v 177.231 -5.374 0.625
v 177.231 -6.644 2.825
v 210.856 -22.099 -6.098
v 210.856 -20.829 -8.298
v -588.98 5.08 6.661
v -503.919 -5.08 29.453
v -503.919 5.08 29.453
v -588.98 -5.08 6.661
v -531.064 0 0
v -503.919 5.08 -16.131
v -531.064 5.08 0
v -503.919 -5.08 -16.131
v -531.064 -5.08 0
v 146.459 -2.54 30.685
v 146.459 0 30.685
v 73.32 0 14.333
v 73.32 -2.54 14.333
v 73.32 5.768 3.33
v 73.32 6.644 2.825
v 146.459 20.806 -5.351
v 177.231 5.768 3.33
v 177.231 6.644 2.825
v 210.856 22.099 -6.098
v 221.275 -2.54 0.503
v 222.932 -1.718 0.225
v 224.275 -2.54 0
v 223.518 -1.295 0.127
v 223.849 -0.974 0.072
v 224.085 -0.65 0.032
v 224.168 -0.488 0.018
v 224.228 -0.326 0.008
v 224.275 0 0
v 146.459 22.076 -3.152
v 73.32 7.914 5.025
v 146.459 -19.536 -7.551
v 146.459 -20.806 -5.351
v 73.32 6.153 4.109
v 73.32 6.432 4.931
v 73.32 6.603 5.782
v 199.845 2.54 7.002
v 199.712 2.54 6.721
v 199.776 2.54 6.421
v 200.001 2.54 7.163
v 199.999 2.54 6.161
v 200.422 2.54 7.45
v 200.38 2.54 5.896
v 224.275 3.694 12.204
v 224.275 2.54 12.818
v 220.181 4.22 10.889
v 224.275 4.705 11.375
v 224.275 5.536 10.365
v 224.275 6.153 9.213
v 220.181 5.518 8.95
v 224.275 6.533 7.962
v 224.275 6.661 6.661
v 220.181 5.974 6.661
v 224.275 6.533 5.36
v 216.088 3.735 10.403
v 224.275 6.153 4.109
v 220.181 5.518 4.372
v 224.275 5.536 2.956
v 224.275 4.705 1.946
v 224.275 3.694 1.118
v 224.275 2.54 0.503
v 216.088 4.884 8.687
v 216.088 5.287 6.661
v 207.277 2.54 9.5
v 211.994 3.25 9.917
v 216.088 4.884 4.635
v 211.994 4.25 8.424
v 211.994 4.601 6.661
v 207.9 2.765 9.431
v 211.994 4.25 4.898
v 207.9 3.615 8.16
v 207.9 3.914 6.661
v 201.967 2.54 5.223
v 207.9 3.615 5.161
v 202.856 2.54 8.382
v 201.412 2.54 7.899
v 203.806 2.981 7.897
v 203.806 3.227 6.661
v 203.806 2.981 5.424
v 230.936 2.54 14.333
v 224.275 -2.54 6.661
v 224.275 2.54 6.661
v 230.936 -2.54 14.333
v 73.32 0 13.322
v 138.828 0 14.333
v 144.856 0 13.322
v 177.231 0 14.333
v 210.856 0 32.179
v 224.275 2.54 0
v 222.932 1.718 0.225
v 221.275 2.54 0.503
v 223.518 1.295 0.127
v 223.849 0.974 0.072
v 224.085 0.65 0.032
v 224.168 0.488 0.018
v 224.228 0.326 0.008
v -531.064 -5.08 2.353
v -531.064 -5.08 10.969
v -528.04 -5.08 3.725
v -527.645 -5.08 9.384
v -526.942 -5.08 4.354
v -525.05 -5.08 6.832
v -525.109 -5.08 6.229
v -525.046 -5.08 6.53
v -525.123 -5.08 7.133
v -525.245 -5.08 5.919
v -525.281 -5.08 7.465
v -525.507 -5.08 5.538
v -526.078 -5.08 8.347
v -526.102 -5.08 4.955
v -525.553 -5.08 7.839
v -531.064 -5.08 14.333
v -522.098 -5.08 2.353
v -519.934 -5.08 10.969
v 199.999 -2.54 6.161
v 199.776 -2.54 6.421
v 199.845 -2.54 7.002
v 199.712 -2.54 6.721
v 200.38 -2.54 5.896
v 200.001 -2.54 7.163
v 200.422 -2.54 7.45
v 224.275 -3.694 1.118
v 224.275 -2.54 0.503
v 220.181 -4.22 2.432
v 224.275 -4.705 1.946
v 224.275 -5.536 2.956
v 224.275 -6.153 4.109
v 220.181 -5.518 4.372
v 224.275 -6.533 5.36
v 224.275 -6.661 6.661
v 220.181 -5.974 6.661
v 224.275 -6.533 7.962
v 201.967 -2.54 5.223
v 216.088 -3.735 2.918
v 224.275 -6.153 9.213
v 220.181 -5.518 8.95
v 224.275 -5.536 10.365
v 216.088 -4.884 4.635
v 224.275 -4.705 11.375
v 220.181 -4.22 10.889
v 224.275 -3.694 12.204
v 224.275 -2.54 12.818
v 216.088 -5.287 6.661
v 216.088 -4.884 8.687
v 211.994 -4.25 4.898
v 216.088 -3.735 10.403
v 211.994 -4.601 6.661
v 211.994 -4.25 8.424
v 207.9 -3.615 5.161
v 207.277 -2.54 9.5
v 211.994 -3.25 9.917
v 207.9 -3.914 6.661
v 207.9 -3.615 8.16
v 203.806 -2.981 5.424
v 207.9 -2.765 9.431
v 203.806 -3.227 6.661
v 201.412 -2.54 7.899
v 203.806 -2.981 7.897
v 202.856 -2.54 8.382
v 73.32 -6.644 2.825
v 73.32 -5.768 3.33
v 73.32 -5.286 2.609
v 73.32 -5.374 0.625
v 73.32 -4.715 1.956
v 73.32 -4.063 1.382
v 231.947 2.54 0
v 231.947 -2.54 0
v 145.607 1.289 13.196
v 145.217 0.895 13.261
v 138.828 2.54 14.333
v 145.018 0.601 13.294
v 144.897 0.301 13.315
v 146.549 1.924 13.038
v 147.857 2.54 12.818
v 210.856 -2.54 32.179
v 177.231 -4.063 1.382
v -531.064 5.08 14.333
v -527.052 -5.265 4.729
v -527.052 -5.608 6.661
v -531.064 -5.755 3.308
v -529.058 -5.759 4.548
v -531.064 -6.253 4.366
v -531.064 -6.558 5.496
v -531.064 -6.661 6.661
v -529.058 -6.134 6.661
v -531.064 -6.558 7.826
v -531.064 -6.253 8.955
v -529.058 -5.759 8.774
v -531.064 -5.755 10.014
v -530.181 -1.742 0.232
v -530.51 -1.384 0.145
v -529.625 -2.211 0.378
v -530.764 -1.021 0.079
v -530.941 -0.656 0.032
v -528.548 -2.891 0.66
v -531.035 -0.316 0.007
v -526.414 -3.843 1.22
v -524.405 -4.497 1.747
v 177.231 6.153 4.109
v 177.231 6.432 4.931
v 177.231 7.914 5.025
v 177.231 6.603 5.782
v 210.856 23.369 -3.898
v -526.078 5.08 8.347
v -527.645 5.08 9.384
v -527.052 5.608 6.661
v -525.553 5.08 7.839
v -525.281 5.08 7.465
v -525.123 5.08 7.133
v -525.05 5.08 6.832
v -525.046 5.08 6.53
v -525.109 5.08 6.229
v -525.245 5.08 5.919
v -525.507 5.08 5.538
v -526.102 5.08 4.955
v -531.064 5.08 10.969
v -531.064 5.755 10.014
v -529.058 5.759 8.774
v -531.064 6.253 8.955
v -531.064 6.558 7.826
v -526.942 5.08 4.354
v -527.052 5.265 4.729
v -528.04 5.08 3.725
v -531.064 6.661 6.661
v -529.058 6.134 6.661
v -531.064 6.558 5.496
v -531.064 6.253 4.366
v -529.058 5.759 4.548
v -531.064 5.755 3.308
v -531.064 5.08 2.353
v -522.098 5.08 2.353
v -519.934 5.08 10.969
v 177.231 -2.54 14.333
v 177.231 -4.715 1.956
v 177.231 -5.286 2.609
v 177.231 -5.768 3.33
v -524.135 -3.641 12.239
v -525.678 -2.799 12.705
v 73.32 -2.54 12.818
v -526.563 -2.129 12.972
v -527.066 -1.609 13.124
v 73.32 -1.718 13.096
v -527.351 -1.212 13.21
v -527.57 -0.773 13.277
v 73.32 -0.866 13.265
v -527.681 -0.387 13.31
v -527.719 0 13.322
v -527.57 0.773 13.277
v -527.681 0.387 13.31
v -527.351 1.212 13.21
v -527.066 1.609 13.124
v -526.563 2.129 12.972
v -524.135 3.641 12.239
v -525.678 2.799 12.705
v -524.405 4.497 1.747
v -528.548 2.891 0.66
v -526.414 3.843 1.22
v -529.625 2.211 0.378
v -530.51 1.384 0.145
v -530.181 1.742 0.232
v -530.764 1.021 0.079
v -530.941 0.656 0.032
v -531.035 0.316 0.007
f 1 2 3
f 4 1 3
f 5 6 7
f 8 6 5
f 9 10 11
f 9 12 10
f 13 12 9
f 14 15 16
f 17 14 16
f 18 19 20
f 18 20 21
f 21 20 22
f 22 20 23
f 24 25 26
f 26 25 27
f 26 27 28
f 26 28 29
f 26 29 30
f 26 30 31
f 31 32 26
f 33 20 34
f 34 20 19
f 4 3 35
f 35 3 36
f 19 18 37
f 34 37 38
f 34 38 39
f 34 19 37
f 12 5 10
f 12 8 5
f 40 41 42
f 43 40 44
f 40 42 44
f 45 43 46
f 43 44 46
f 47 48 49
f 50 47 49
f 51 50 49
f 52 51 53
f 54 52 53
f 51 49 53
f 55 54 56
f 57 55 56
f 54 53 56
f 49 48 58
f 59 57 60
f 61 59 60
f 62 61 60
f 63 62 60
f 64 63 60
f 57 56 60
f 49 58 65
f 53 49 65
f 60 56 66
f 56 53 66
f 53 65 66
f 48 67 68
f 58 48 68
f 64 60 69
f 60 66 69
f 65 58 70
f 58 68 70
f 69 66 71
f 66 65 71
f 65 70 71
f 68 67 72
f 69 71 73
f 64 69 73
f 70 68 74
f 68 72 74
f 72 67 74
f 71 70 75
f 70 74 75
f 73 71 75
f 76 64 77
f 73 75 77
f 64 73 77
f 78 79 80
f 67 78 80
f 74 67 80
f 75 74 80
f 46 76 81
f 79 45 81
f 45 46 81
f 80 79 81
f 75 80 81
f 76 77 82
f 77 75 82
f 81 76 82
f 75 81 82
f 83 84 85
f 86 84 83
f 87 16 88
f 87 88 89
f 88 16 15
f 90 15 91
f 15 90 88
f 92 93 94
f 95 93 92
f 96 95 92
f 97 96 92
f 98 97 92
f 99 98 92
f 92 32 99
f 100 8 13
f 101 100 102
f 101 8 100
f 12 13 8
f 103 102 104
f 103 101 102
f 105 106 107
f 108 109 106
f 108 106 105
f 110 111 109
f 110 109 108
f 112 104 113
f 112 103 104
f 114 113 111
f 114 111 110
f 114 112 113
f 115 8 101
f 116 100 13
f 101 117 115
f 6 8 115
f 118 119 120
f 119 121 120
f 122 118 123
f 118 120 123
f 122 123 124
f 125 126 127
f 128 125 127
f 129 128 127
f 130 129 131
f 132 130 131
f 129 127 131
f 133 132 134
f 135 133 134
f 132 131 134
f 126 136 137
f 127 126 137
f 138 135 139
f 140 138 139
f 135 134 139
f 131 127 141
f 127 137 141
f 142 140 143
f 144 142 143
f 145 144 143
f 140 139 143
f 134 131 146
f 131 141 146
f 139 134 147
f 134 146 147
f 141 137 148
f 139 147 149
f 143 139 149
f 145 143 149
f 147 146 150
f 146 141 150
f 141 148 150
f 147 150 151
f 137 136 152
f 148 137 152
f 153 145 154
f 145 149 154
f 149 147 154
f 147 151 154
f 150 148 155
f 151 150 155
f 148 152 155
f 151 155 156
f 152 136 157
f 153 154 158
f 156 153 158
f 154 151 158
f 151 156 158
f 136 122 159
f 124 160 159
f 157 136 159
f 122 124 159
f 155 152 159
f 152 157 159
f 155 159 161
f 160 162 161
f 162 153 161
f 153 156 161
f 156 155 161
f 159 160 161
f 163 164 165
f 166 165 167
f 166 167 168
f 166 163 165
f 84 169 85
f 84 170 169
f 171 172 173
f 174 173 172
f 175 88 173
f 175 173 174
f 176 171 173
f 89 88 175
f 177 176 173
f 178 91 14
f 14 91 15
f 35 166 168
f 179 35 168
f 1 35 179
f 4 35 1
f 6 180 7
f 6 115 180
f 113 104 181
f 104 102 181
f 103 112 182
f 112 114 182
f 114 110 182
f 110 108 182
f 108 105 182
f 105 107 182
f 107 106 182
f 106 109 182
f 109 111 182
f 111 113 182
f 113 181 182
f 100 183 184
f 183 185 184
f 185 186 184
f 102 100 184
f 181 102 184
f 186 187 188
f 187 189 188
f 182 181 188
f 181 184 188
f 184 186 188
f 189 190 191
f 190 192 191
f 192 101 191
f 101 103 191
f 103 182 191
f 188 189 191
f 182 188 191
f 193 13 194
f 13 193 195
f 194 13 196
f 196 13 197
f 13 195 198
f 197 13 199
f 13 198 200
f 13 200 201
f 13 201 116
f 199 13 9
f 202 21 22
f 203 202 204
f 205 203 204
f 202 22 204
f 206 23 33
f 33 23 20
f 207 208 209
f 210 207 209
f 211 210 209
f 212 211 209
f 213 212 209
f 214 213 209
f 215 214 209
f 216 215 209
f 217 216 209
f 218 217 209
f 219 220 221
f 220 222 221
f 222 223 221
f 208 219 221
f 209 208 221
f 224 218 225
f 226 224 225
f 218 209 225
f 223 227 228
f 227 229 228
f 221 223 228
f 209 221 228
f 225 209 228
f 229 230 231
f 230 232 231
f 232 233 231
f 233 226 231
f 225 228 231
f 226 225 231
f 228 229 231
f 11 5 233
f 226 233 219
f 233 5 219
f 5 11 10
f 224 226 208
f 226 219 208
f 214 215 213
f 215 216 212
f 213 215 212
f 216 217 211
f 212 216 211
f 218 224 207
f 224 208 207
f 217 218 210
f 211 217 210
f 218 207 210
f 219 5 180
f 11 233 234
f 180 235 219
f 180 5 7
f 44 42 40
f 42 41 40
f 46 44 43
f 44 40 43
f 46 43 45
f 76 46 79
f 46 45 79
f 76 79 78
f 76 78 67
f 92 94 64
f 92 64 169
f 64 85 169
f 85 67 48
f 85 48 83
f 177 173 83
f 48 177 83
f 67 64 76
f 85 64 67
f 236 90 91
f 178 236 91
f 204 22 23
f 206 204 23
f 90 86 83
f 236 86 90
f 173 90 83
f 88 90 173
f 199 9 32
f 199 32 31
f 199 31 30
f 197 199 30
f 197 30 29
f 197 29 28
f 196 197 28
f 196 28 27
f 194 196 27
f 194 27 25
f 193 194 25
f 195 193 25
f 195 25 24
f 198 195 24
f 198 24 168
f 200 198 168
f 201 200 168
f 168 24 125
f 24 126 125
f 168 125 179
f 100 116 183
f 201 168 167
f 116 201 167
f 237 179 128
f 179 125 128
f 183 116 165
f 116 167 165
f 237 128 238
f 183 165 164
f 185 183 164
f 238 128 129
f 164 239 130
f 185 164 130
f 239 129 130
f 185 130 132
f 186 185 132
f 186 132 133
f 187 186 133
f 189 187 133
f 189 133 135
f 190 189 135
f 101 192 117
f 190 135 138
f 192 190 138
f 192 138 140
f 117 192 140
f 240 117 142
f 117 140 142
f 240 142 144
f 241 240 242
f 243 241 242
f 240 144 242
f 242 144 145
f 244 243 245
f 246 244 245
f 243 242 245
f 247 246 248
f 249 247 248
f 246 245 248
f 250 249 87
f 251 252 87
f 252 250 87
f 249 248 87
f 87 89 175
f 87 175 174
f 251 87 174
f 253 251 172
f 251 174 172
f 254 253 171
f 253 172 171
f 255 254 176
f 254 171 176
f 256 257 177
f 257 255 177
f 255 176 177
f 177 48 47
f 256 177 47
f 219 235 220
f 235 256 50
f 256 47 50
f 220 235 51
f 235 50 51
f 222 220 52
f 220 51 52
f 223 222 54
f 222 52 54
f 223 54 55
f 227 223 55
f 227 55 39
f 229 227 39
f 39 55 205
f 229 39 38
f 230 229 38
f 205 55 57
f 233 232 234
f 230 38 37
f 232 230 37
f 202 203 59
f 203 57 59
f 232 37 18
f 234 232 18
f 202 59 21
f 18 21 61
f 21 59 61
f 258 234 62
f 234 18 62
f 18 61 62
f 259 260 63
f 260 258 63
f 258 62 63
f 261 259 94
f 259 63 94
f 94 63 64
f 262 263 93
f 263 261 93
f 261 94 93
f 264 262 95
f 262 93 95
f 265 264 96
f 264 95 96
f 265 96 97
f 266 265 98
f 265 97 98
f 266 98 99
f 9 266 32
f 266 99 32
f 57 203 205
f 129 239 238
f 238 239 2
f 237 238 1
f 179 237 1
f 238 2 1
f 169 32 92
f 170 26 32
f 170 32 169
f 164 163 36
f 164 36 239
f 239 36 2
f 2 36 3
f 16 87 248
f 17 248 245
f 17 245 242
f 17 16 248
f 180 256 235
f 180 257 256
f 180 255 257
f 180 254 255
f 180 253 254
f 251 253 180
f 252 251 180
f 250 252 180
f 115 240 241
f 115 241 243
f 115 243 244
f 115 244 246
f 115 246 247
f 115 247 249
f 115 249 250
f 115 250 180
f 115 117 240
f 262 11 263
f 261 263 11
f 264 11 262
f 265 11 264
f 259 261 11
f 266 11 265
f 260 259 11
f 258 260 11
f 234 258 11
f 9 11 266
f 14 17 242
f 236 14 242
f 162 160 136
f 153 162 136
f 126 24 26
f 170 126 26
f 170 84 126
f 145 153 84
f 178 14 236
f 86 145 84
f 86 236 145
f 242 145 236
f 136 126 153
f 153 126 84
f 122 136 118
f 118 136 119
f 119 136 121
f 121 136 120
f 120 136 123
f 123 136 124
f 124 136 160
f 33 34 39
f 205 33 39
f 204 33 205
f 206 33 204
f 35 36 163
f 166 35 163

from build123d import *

# Parameters (mm, degrees)
F2_DEPTH      = 5.08
F3_DEPTH      = 5.08
F4_DEPTH      = 2.54
F5_COUNT      = 3
F6_DEPTH      = 10.16
F7_DEPTH      = 10.16
F8_DEPTH      = 7.62
F9_DEPTH      = 2.54
F9_DEPTH_BACK = 2.54


with BuildPart() as f1:
    # F0 (on Front) → F1 (revolve)
    with BuildSketch(Plane.XZ):
        Polygon((-531.0639472567, 0), (224.2752164602, 0), (184.5656899125, 6.6608362831), (-505.6800862797, 6.6608362831), align=None)
    revolve(axis=Axis((-140.7024349097, 0, 6.6608362831), (-1, 0, 0)))

    # F0 (on Front) → F2 (join)
    with BuildSketch(Plane.XZ):
        Polygon((-503.9185357909, -16.1311917064), (-531.0639472567, 0), (-505.6800862797, 6.6608362831), (-531.0639472567, 14.332789099), (-503.9185357909, 29.4528642727), (-588.9795422554, 6.6608362831), align=None)
    extrude(amount=F2_DEPTH)

    # F0 (on Front) → F3 (join)
    with BuildSketch(Plane.XZ):
        Polygon((-503.9185357909, -16.1311917064), (-531.0639472567, 0), (-505.6800862797, 6.6608362831), (-531.0639472567, 14.332789099), (-503.9185357909, 29.4528642727), (-588.9795422554, 6.6608362831), align=None)
    extrude(amount=-F3_DEPTH)



with BuildPart() as f4:
    # F0 (on Front) → F4 (new body)
    with BuildSketch(Plane.XZ):
        Polygon((138.8282477856, 14.332789099), (177.2306859493, 14.332789099), (210.8558267355, 32.1787036955), (146.4593857527, 30.6850112975), (73.320440948, 14.332789099), align=None)
    extrude(amount=F4_DEPTH)


with BuildPart() as f5_1:
    # F5: instance of F4
    add(f4.part.rotate(Axis((-140.7024349097, 0, 6.6608362831), (-1, 0, 0)), 1 * 360 / F5_COUNT))


with BuildPart() as f5_2:
    # F5: instance of F4
    add(f4.part.rotate(Axis((-140.7024349097, 0, 6.6608362831), (-1, 0, 0)), 2 * 360 / F5_COUNT))


with BuildPart() as f1_1:
    add(f1.part)
    # F6 (add): a face of the model
    f6_faces = [f5_1.part.faces().sort_by_distance(p)[0] for p in [
        (125.2755634487, 7.2791060352, 3.924712138),
    ]]

    add(f5_1.part)  # F6 merges F5_1
    extrude(f6_faces, amount=F6_DEPTH)

    # F7 (add): a face of the model
    f7_faces = [f4.part.faces().sort_by_distance(p)[0] for p in [
        (125.2755634487, -1.27, 14.332789099),
    ]]

    add(f4.part)  # F7 merges F4
    extrude(f7_faces, amount=F7_DEPTH)

    # F8 (add): a face of the model
    f8_faces = [f5_2.part.faces().sort_by_distance(p)[0] for p in [
        (125.2755634487, -6.0091060352, 1.7250076124),
    ]]

    add(f5_2.part)  # F8 merges F5_2
    extrude(f8_faces, amount=F8_DEPTH)

    # F0 (on Front) → F9 (join, two sides)
    with BuildSketch(Plane.XZ) as f9_sk:
        Polygon((184.5656899125, 6.6608362831), (224.2752164602, 6.6608362831), (230.9360527433, 14.332789099), (177.2306859493, 14.332789099), (138.8282477856, 14.332789099), align=None)
        Polygon((224.2752164602, 0), (231.9471692761, 0), (224.2752164602, 6.6608362831), (184.5656899125, 6.6608362831), align=None)
    extrude(amount=F9_DEPTH)
    extrude(f9_sk.sketch, amount=-F9_DEPTH_BACK)


solid = f1_1.part
